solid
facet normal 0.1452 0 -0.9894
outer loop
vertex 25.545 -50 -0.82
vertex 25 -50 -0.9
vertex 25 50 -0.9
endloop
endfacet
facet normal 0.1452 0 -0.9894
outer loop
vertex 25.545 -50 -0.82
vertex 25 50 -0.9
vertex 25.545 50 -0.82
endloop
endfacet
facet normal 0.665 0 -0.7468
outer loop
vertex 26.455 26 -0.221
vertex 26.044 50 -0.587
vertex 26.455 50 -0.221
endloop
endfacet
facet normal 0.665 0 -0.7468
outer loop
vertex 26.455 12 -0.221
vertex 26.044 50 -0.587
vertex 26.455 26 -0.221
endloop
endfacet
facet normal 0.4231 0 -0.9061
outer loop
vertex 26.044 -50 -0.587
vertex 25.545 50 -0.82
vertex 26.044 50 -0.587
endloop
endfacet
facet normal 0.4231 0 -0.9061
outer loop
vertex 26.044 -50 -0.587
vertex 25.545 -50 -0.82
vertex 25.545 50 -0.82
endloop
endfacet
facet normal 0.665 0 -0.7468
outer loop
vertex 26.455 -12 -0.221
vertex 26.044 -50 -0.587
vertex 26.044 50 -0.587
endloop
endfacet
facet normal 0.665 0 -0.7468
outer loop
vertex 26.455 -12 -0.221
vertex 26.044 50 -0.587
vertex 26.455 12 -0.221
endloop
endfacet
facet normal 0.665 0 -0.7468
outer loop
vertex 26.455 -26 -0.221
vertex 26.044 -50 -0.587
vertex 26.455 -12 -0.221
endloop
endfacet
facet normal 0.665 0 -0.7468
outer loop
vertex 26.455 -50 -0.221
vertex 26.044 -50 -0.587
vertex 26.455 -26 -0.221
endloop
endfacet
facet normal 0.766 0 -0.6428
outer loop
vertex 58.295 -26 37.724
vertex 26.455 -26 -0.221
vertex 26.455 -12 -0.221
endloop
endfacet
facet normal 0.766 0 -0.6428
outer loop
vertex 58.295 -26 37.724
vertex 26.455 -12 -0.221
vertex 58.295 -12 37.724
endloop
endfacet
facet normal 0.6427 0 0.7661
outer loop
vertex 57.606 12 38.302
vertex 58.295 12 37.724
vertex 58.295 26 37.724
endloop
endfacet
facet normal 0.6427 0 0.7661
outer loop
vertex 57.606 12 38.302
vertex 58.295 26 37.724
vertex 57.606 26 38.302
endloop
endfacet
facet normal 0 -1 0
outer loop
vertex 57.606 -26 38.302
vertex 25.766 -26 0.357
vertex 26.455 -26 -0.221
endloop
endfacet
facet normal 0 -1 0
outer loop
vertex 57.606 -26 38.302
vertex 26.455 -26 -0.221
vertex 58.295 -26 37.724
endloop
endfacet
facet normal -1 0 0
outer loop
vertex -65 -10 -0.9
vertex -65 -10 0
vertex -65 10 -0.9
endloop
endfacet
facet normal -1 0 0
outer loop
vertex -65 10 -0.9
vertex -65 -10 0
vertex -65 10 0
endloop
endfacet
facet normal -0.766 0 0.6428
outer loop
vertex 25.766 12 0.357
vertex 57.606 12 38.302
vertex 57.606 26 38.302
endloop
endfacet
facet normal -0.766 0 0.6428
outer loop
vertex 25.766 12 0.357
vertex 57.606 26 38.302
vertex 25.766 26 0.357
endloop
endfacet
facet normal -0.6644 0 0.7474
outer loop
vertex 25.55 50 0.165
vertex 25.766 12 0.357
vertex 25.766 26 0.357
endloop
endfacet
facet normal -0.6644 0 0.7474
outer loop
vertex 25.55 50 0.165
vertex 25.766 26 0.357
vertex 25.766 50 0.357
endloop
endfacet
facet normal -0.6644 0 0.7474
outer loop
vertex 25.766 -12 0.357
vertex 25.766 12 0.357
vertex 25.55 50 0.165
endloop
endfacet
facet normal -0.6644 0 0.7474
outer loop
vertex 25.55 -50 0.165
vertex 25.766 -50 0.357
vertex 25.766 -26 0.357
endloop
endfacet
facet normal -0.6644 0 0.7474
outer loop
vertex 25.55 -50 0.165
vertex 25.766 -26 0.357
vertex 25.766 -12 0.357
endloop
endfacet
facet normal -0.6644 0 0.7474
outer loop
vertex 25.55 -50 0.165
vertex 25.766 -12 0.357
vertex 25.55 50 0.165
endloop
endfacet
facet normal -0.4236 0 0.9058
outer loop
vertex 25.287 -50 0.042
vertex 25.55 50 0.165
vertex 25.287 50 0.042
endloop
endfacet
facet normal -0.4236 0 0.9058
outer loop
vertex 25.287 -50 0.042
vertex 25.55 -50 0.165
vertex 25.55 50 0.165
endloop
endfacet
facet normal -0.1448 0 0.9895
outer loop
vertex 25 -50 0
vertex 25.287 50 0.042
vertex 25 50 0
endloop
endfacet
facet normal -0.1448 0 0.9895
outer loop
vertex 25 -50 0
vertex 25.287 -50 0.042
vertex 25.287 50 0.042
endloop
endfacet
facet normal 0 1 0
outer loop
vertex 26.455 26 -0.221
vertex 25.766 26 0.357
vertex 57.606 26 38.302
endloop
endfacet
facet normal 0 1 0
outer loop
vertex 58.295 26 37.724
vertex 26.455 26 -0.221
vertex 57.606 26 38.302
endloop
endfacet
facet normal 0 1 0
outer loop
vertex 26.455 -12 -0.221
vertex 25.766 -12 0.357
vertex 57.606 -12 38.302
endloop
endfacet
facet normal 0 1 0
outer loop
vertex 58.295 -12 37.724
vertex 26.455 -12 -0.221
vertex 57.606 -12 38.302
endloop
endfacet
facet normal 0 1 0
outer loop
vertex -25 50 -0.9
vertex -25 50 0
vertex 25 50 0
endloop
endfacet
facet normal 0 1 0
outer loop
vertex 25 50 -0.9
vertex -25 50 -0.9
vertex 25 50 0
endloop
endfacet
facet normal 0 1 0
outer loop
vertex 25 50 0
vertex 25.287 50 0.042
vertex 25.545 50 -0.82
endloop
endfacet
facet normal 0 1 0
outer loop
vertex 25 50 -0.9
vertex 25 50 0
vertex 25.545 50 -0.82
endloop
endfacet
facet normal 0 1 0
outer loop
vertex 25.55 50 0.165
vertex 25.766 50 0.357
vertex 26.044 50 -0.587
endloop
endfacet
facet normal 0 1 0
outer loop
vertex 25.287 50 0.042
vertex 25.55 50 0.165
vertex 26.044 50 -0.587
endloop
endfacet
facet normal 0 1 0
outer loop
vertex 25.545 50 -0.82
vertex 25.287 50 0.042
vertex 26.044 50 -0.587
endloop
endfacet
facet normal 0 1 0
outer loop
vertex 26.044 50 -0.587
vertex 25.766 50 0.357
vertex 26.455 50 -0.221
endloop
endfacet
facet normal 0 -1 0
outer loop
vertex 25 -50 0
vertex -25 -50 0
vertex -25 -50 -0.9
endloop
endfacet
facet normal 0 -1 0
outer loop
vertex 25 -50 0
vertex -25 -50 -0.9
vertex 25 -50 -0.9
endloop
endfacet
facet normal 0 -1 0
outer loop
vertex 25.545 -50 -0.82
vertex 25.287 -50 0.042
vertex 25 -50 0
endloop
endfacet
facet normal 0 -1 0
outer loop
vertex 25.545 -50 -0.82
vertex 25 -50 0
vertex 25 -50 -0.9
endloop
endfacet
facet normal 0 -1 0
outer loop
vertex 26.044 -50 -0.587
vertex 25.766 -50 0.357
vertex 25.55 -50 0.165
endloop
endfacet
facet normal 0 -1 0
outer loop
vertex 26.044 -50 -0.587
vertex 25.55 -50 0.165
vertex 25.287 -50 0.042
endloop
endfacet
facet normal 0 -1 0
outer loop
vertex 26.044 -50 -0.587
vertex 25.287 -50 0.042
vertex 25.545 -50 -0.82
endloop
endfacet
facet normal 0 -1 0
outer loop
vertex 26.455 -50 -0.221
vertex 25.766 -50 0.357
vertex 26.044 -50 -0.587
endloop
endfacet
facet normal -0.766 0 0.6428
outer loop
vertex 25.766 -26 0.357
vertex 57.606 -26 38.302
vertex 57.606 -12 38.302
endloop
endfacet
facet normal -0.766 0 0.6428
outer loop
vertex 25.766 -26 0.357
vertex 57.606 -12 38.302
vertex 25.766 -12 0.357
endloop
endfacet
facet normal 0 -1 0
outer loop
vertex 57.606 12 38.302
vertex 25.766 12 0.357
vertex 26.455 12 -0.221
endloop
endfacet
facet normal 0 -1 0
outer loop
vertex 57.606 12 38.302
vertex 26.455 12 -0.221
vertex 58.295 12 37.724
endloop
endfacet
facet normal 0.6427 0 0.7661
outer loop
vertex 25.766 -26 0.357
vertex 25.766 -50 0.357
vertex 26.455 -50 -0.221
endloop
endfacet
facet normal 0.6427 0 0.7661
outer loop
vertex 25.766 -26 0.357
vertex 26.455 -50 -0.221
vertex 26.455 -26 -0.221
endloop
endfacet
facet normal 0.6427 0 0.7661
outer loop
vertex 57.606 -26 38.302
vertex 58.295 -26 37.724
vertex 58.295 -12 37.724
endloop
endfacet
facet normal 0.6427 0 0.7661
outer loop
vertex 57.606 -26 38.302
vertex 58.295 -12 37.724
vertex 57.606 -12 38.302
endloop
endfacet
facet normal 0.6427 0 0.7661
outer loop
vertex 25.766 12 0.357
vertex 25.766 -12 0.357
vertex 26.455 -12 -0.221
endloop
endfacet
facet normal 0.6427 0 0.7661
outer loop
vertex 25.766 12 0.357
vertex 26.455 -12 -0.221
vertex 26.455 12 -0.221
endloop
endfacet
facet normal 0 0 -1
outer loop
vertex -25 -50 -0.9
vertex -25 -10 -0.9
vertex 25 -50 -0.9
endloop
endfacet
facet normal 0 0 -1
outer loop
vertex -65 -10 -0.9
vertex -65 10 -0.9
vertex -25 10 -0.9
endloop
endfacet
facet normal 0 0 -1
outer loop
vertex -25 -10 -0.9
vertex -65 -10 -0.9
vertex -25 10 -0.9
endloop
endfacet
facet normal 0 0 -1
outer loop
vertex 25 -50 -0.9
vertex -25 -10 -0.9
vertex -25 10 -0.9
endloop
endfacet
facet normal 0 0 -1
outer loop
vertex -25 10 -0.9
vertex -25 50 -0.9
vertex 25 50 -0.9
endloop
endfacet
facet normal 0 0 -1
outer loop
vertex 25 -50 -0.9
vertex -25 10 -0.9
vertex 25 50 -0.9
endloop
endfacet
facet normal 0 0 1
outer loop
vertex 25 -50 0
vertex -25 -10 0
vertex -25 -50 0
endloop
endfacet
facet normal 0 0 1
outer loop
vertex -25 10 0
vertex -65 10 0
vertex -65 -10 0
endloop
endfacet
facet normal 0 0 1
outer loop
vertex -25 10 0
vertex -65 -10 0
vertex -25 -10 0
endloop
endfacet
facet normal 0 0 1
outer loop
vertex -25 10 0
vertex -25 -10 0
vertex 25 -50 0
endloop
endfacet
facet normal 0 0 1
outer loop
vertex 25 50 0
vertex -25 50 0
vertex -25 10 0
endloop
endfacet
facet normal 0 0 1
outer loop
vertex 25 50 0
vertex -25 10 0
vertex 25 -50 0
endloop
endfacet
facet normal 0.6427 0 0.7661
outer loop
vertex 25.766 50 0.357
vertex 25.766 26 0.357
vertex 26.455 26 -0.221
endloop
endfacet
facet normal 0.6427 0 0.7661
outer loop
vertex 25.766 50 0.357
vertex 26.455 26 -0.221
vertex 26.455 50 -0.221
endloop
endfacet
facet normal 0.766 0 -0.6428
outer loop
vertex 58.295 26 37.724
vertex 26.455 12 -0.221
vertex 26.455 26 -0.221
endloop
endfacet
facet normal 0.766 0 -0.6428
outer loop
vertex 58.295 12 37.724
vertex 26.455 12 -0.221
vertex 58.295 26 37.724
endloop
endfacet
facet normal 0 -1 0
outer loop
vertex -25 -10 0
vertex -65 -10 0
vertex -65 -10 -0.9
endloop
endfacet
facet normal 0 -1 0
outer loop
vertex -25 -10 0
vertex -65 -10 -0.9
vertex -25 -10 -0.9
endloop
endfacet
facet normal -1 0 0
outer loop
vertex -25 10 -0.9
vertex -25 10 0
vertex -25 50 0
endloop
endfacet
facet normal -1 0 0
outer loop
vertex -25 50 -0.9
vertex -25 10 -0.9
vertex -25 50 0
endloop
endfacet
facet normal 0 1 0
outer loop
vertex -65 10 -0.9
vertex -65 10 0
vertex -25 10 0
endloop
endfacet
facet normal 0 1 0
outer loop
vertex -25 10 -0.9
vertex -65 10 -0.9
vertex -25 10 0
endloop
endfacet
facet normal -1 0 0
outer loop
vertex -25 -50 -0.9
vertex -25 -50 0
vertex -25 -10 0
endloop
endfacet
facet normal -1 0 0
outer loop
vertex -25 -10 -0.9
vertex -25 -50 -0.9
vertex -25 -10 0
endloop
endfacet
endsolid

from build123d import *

# Parameters (mm, degrees)
SKETCH2_W          = 50
SKETCH2_H          = 100
BASE_FLANGE1_DEPTH = 0.9
EDGE_FLANGE1_DEPTH = 100
SKETCH10_W         = 49.533692342
SKETCH10_H         = 24
CUT_EXTRUDE1_DEPTH = 10
SKETCH12_W         = 49.533692342
SKETCH12_H         = 24
CUT_EXTRUDE2_DEPTH = 10
SKETCH13_W         = 49.533692342
SKETCH13_H         = 24
CUT_EXTRUDE3_DEPTH = 10
SKETCH17_W         = 80
SKETCH17_H         = 20
TAB4_DEPTH         = 0.9


# Sheet-metal steps are written as plain solids
with BuildPart() as part:
    # Sketch2 → Base-Flange1 (new body)
    with BuildSketch(Plane.XY):
        Rectangle(SKETCH2_W, SKETCH2_H)
    extrude(amount=-BASE_FLANGE1_DEPTH)

    # Edge-Flange1 section (across the edge) → Edge-Flange1 (add)
    with BuildSketch(Plane(origin=(25.466307658, -50, 0), x_dir=(-0.7660444431189747, 0, 0.6427876096865435), z_dir=(0, 1, 0))):
        with BuildLine():
            Line((-0.9, 0.466307658), (-0.9, 50))
            Line((-0.9, 50), (0, 50))
            Line((0, 50), (0, 0.466307658))
            ThreePointArc((0, 0.466307658), (0.093692213, 0.043689396), (0.35721239, -0.299736785))
            Line((0.35721239, -0.299736785), (-0.221296458, -0.989176784))
            ThreePointArc((-0.221296458, -0.989176784), (-0.721984795, -0.336667039), (-0.9, 0.466307658))
        make_face()
    extrude(amount=EDGE_FLANGE1_DEPTH)

    # Sketch10 → Cut-Extrude1 (cut)
    with BuildSketch(Plane(origin=(14.944242787, 0, -12.539708611), x_dir=(0.6427876096865437, 0, 0.7660444431189746), z_dir=(-0.7660444431189746, 0, 0.6427876096865437))):
        with Locations((41.602580856, 38)):
            Rectangle(SKETCH10_W, SKETCH10_H)
    extrude(amount=-CUT_EXTRUDE1_DEPTH, mode=Mode.SUBTRACT)

    # Sketch12 → Cut-Extrude2 (cut)
    with BuildSketch(Plane(origin=(14.944242787, 0, -12.539708611), x_dir=(0.6427876096865437, 0, 0.7660444431189746), z_dir=(-0.7660444431189746, 0, 0.6427876096865437))):
        with Locations((41.602580856, 0)):
            Rectangle(SKETCH12_W, SKETCH12_H)
    extrude(amount=-CUT_EXTRUDE2_DEPTH, mode=Mode.SUBTRACT)

    # Sketch13 → Cut-Extrude3 (cut)
    with BuildSketch(Plane(origin=(14.944242787, 0, -12.539708611), x_dir=(0.6427876096865437, 0, 0.7660444431189746), z_dir=(-0.7660444431189746, 0, 0.6427876096865437))):
        with Locations((41.602580856, -38)):
            Rectangle(SKETCH13_W, SKETCH13_H)
    extrude(amount=-CUT_EXTRUDE3_DEPTH, mode=Mode.SUBTRACT)

    # Sketch17 → Tab4 (add)
    with BuildSketch(Plane.XY):
        with Locations((-25, 0)):
            Rectangle(SKETCH17_W, SKETCH17_H)
    extrude(amount=-TAB4_DEPTH)


solid = part.part
